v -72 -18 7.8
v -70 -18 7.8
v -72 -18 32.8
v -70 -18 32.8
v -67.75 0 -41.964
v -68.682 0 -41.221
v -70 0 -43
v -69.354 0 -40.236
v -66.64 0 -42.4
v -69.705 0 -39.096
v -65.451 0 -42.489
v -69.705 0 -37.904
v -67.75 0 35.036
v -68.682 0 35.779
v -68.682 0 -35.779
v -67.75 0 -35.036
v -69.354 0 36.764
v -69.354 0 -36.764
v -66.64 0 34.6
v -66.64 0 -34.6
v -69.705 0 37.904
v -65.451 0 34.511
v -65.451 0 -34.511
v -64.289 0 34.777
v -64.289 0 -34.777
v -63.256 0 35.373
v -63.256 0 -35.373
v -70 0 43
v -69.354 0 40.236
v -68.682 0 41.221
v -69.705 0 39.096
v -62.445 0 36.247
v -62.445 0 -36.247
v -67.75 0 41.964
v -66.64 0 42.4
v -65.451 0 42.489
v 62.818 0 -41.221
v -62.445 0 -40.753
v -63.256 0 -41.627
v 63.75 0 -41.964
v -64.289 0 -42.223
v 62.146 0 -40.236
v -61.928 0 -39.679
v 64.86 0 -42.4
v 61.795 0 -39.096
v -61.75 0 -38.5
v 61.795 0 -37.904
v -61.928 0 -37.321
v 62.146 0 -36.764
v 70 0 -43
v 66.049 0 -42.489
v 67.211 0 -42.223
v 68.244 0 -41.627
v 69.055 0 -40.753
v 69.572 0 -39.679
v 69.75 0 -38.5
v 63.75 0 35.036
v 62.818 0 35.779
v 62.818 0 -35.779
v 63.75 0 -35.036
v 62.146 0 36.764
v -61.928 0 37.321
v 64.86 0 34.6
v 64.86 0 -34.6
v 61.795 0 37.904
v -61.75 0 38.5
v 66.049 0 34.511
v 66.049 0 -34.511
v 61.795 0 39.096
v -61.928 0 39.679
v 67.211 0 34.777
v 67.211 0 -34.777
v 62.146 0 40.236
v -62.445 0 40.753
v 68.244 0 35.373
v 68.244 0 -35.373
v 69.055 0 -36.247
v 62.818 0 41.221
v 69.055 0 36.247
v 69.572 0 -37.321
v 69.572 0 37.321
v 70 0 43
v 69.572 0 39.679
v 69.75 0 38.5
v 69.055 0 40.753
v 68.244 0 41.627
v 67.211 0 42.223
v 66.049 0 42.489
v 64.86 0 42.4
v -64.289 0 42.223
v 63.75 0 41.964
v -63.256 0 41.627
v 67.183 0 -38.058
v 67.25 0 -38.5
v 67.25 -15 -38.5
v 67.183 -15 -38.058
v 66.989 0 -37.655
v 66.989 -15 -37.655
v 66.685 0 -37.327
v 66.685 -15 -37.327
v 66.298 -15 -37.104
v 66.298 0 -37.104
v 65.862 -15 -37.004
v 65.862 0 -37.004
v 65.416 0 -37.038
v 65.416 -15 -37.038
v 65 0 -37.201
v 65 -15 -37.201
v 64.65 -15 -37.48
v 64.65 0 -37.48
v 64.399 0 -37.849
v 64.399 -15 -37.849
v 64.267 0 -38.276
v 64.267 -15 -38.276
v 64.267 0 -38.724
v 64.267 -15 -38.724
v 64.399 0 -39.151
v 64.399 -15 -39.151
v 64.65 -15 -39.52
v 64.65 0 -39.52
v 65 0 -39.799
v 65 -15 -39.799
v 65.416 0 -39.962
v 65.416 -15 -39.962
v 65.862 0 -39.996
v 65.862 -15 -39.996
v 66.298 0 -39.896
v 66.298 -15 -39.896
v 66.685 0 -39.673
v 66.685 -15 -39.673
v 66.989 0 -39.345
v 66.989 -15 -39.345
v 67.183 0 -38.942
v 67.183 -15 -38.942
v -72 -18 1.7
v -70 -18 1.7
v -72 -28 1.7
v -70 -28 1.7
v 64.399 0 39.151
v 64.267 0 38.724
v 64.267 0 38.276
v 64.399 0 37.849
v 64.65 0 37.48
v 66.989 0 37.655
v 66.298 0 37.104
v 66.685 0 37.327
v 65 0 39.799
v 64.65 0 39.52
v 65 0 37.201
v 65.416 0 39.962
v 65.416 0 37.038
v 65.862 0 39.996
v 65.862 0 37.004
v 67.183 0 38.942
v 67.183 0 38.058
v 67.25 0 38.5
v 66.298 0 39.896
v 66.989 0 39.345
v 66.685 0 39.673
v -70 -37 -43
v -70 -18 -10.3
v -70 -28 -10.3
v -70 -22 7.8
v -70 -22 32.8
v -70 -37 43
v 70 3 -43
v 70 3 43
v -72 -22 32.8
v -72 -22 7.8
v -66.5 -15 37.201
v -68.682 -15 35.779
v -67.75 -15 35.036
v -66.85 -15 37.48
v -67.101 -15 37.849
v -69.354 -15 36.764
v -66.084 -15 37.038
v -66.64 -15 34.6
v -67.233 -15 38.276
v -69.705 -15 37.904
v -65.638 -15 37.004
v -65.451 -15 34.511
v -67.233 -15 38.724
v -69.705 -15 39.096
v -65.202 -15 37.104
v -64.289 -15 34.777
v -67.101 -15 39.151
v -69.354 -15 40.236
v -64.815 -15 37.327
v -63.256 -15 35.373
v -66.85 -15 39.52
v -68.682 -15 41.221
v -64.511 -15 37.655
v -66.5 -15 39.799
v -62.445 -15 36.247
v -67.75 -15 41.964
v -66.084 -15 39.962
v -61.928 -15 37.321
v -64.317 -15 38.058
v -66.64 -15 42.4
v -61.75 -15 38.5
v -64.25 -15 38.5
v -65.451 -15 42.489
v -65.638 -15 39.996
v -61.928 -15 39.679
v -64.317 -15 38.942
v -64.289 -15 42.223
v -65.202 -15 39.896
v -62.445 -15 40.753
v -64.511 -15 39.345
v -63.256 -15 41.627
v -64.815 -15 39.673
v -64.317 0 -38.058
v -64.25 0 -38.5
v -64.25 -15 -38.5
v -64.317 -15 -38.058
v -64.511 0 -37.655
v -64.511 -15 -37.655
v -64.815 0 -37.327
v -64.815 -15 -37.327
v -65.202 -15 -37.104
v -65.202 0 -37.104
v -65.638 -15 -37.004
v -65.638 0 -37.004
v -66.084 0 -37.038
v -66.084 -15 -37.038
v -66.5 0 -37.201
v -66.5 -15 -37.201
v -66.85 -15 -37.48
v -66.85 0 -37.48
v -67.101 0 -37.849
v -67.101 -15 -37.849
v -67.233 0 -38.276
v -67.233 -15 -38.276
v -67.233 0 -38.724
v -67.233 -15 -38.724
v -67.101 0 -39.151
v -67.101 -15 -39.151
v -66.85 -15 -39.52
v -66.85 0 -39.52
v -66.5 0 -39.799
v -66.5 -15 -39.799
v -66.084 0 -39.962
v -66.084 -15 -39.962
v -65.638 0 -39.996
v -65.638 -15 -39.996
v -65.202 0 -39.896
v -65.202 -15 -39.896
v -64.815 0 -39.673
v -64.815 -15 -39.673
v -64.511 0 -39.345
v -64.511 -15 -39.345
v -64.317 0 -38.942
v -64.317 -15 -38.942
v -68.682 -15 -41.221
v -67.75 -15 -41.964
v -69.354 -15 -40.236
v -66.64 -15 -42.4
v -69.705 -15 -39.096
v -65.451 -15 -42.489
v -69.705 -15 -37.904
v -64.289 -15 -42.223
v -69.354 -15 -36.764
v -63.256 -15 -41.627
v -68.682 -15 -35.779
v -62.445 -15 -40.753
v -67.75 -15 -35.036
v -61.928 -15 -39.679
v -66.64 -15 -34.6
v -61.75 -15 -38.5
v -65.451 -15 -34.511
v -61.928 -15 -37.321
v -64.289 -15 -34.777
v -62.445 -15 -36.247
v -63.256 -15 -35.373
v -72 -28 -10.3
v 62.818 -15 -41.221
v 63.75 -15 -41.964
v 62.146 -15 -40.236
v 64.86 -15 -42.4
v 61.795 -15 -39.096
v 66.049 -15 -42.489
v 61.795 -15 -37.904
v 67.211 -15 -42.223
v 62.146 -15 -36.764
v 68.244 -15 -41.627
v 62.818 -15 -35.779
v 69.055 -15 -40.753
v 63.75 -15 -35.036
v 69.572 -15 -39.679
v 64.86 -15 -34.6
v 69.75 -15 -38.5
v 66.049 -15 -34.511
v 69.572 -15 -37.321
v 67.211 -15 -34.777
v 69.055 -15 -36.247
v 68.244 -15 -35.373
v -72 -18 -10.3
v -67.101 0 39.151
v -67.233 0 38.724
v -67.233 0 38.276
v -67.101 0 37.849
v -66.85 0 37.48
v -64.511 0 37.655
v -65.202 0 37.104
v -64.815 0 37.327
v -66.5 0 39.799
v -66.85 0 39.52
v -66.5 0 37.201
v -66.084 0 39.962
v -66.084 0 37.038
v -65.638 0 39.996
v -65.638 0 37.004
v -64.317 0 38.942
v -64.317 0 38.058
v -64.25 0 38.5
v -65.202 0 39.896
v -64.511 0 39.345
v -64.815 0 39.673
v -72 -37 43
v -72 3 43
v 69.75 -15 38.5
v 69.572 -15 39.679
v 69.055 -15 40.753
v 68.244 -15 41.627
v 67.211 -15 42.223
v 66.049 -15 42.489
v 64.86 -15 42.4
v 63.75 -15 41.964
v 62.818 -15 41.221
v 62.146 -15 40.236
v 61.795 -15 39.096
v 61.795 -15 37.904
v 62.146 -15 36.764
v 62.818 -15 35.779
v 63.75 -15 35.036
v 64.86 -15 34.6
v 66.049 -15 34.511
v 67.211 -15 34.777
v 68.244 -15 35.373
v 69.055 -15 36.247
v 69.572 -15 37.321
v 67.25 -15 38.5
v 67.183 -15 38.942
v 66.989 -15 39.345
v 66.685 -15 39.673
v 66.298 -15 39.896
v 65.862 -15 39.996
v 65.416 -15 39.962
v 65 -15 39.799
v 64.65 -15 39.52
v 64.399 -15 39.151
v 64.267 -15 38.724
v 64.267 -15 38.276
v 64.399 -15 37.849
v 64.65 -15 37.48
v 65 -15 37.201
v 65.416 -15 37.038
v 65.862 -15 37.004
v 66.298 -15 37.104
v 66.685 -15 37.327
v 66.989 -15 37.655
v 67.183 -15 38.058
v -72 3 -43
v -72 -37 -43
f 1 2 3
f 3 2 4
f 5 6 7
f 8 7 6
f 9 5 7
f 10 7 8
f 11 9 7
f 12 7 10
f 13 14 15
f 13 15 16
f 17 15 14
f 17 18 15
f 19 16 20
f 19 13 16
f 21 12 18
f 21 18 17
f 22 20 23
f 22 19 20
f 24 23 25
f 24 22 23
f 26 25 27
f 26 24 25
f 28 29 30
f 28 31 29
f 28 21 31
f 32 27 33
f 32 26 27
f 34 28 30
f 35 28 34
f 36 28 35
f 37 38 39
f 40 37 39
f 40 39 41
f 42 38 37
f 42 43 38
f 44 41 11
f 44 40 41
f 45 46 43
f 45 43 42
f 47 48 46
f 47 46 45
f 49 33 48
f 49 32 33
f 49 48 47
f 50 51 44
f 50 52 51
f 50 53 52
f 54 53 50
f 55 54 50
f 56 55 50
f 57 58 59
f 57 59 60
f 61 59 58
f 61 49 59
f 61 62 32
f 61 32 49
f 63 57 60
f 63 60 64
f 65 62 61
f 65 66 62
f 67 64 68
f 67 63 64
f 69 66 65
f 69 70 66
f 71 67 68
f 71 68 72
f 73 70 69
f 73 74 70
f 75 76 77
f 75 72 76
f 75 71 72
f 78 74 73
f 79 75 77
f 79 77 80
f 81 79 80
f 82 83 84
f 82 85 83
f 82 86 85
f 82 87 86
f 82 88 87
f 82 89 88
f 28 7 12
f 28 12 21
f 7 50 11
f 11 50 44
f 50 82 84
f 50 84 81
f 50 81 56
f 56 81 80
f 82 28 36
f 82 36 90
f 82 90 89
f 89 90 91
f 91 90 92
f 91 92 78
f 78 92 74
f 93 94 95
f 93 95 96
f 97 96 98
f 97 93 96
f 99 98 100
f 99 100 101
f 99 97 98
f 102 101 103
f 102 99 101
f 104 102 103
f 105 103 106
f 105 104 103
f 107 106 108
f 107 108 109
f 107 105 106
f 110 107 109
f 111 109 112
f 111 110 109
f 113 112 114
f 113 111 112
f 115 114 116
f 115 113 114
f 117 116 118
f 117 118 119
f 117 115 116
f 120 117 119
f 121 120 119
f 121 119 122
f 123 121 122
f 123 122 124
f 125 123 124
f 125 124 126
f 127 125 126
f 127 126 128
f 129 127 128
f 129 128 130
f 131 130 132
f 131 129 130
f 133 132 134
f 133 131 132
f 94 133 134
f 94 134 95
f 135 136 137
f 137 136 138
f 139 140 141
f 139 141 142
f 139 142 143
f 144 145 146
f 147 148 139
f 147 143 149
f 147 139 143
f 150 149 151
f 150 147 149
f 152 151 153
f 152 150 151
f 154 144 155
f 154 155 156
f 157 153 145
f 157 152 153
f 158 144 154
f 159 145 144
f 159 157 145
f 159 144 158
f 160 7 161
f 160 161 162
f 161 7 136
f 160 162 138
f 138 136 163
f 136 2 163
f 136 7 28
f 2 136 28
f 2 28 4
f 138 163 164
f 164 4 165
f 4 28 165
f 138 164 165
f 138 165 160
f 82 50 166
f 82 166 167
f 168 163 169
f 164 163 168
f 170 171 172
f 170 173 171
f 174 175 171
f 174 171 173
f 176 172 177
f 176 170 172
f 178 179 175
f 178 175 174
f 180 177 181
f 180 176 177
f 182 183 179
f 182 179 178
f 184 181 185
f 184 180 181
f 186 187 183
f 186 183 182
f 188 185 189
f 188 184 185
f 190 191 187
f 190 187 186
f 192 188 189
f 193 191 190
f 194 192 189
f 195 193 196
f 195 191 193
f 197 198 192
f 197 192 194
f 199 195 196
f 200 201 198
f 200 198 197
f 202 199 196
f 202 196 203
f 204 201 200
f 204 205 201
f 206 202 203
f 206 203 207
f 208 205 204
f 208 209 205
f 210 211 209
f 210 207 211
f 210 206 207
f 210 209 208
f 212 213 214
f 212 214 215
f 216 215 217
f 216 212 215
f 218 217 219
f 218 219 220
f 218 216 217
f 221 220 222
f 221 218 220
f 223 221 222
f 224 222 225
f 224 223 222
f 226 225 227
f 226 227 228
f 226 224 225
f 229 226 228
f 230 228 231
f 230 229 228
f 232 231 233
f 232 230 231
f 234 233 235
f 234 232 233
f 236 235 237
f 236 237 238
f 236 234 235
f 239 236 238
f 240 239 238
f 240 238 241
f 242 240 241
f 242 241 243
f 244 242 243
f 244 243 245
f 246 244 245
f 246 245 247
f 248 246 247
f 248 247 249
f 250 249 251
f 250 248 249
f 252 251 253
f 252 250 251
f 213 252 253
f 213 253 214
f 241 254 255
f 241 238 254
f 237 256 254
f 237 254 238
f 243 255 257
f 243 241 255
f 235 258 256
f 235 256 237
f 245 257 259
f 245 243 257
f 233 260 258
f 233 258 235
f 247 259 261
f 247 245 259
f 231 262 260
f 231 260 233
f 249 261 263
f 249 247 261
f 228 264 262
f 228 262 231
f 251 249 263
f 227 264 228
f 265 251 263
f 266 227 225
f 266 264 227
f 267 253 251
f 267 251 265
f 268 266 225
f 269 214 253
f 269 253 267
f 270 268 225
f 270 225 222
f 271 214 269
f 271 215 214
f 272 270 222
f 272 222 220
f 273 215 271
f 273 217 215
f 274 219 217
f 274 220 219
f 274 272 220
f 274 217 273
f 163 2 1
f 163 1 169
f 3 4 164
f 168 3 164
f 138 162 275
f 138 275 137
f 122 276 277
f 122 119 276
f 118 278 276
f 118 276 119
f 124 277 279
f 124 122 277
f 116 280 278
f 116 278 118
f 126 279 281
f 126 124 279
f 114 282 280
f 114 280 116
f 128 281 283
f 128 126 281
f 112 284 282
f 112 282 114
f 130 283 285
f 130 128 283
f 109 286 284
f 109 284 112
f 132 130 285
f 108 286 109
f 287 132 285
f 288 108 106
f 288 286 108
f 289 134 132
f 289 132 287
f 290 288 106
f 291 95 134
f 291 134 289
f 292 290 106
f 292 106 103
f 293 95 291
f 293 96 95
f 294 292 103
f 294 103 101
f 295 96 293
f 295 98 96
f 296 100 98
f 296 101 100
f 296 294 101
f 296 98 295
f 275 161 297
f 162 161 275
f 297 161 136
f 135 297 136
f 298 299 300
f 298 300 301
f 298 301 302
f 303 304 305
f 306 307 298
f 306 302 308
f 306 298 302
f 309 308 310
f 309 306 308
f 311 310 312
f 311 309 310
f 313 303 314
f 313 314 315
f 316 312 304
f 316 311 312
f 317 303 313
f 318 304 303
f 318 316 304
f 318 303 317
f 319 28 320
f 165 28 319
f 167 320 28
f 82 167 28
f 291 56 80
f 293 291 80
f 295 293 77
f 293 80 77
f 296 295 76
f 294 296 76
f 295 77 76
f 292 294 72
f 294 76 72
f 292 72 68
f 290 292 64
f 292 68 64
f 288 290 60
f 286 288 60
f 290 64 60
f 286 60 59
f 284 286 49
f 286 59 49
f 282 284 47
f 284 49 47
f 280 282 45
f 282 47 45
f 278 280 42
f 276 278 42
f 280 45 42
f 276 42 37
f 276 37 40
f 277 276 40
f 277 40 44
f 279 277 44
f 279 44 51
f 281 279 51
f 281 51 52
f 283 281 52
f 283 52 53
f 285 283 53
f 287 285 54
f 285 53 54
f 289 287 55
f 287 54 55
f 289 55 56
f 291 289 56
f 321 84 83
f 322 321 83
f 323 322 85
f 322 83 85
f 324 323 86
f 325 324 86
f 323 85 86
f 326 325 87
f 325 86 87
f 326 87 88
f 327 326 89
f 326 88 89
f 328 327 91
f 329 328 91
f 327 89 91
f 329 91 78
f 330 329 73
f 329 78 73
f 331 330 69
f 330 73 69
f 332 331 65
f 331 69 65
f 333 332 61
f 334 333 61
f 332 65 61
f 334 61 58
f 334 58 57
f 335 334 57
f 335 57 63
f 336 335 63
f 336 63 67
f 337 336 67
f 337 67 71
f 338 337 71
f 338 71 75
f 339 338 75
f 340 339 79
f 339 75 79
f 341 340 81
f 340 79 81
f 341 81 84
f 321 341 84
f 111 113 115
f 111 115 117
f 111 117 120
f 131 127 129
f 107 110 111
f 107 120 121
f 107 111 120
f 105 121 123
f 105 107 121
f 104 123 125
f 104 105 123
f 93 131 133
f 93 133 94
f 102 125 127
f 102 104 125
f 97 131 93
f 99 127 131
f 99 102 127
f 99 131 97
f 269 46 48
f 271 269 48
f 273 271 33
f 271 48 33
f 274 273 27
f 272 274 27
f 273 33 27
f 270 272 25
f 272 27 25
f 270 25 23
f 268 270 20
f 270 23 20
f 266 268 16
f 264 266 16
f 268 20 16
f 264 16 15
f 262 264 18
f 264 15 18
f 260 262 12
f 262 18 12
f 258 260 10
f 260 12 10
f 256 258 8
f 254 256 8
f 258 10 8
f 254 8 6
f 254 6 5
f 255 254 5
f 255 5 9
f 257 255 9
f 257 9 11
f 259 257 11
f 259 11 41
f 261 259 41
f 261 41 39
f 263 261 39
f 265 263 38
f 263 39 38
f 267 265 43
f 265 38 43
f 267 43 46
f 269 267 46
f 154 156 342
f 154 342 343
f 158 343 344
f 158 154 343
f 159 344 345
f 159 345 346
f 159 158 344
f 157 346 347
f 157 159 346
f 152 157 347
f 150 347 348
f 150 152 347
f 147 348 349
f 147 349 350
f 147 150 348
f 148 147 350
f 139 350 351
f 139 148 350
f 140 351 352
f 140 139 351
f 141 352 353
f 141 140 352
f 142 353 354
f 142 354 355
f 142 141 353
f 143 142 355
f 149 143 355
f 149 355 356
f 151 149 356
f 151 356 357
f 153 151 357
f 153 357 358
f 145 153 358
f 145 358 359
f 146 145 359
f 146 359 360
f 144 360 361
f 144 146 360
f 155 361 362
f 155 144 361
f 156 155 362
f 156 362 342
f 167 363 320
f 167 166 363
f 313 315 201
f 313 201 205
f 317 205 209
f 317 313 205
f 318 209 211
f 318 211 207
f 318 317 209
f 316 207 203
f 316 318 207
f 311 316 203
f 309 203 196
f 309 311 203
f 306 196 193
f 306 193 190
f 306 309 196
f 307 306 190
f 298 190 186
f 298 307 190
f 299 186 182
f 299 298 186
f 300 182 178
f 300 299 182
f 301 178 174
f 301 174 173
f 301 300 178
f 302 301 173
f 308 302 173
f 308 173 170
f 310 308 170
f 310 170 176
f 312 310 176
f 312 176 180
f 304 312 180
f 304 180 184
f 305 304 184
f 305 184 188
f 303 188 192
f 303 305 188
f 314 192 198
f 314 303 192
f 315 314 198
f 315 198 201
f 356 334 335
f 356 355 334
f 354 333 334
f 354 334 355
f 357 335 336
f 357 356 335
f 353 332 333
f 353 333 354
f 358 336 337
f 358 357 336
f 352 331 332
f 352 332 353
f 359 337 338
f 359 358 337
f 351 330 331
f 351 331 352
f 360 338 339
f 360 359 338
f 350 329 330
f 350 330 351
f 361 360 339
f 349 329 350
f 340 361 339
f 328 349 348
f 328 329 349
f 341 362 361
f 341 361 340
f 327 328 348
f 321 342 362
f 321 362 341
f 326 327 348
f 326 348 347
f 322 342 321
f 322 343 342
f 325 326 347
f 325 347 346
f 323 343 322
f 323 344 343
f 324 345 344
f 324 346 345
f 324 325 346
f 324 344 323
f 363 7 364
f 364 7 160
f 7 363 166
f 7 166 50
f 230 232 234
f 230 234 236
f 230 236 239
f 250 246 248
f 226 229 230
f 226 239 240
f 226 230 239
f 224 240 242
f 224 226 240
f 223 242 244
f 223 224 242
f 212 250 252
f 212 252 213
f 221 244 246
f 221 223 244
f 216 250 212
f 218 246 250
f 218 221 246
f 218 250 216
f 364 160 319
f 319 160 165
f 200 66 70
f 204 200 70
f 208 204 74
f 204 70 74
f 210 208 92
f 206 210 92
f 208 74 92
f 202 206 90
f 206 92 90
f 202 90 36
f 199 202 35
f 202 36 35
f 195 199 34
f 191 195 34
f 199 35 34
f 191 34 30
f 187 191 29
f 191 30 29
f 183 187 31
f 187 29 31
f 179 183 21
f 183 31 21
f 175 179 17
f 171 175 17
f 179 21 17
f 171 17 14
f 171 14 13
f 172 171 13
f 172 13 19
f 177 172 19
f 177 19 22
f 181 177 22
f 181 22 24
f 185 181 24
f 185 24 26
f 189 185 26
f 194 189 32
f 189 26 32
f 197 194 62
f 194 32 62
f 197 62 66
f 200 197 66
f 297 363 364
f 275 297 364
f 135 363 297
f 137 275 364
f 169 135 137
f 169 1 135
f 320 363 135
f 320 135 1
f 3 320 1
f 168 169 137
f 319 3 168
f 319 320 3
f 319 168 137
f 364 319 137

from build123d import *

# Parameters (mm, degrees)
F0_W     = 140
F0_H     = 86
F1_DEPTH = 3
F2_R     = 4
F2_R_2   = 1.5
F3_DEPTH = 15
F4_W     = 40
F4_H     = 86
F4_W_2   = 10
F4_H_2   = 12
F4_W_3   = 4
F4_H_3   = 25
F5_DEPTH = 2


with BuildPart() as f1:
    # F0 (on Front) → F1 (new body)
    with BuildSketch(Plane.XZ):
        Rectangle(F0_W, F0_H)
    extrude(amount=-F1_DEPTH)

    # F2 (on face) → F3 (join)
    with BuildSketch(Plane.XZ):
        with Locations((65.75, 38.5)):
            Circle(F2_R)
        with Locations((65.75, 38.5)):
            Circle(F2_R_2, mode=Mode.SUBTRACT)
        with Locations((-65.75, 38.5)):
            Circle(F2_R)
        with Locations((-65.75, 38.5)):
            Circle(F2_R_2, mode=Mode.SUBTRACT)
        with Locations((-65.75, -38.5)):
            Circle(F2_R)
        with Locations((-65.75, -38.5)):
            Circle(F2_R_2, mode=Mode.SUBTRACT)
        with Locations((65.75, -38.5)):
            Circle(F2_R)
        with Locations((65.75, -38.5)):
            Circle(F2_R_2, mode=Mode.SUBTRACT)
    extrude(amount=F3_DEPTH)

    # F4 (on face) → F5 (join)
    with BuildSketch(Plane(origin=(-70, 0, 0), x_dir=(0, -1, 0), z_dir=(-1, 0, 0))):
        with Locations((17, 0)):
            Rectangle(F4_W, F4_H)
        with Locations((23, -4.3)):
            Rectangle(F4_W_2, F4_H_2, mode=Mode.SUBTRACT)
        with Locations((20, 20.3)):
            Rectangle(F4_W_3, F4_H_3, mode=Mode.SUBTRACT)
    extrude(amount=F5_DEPTH)


solid = f1.part
